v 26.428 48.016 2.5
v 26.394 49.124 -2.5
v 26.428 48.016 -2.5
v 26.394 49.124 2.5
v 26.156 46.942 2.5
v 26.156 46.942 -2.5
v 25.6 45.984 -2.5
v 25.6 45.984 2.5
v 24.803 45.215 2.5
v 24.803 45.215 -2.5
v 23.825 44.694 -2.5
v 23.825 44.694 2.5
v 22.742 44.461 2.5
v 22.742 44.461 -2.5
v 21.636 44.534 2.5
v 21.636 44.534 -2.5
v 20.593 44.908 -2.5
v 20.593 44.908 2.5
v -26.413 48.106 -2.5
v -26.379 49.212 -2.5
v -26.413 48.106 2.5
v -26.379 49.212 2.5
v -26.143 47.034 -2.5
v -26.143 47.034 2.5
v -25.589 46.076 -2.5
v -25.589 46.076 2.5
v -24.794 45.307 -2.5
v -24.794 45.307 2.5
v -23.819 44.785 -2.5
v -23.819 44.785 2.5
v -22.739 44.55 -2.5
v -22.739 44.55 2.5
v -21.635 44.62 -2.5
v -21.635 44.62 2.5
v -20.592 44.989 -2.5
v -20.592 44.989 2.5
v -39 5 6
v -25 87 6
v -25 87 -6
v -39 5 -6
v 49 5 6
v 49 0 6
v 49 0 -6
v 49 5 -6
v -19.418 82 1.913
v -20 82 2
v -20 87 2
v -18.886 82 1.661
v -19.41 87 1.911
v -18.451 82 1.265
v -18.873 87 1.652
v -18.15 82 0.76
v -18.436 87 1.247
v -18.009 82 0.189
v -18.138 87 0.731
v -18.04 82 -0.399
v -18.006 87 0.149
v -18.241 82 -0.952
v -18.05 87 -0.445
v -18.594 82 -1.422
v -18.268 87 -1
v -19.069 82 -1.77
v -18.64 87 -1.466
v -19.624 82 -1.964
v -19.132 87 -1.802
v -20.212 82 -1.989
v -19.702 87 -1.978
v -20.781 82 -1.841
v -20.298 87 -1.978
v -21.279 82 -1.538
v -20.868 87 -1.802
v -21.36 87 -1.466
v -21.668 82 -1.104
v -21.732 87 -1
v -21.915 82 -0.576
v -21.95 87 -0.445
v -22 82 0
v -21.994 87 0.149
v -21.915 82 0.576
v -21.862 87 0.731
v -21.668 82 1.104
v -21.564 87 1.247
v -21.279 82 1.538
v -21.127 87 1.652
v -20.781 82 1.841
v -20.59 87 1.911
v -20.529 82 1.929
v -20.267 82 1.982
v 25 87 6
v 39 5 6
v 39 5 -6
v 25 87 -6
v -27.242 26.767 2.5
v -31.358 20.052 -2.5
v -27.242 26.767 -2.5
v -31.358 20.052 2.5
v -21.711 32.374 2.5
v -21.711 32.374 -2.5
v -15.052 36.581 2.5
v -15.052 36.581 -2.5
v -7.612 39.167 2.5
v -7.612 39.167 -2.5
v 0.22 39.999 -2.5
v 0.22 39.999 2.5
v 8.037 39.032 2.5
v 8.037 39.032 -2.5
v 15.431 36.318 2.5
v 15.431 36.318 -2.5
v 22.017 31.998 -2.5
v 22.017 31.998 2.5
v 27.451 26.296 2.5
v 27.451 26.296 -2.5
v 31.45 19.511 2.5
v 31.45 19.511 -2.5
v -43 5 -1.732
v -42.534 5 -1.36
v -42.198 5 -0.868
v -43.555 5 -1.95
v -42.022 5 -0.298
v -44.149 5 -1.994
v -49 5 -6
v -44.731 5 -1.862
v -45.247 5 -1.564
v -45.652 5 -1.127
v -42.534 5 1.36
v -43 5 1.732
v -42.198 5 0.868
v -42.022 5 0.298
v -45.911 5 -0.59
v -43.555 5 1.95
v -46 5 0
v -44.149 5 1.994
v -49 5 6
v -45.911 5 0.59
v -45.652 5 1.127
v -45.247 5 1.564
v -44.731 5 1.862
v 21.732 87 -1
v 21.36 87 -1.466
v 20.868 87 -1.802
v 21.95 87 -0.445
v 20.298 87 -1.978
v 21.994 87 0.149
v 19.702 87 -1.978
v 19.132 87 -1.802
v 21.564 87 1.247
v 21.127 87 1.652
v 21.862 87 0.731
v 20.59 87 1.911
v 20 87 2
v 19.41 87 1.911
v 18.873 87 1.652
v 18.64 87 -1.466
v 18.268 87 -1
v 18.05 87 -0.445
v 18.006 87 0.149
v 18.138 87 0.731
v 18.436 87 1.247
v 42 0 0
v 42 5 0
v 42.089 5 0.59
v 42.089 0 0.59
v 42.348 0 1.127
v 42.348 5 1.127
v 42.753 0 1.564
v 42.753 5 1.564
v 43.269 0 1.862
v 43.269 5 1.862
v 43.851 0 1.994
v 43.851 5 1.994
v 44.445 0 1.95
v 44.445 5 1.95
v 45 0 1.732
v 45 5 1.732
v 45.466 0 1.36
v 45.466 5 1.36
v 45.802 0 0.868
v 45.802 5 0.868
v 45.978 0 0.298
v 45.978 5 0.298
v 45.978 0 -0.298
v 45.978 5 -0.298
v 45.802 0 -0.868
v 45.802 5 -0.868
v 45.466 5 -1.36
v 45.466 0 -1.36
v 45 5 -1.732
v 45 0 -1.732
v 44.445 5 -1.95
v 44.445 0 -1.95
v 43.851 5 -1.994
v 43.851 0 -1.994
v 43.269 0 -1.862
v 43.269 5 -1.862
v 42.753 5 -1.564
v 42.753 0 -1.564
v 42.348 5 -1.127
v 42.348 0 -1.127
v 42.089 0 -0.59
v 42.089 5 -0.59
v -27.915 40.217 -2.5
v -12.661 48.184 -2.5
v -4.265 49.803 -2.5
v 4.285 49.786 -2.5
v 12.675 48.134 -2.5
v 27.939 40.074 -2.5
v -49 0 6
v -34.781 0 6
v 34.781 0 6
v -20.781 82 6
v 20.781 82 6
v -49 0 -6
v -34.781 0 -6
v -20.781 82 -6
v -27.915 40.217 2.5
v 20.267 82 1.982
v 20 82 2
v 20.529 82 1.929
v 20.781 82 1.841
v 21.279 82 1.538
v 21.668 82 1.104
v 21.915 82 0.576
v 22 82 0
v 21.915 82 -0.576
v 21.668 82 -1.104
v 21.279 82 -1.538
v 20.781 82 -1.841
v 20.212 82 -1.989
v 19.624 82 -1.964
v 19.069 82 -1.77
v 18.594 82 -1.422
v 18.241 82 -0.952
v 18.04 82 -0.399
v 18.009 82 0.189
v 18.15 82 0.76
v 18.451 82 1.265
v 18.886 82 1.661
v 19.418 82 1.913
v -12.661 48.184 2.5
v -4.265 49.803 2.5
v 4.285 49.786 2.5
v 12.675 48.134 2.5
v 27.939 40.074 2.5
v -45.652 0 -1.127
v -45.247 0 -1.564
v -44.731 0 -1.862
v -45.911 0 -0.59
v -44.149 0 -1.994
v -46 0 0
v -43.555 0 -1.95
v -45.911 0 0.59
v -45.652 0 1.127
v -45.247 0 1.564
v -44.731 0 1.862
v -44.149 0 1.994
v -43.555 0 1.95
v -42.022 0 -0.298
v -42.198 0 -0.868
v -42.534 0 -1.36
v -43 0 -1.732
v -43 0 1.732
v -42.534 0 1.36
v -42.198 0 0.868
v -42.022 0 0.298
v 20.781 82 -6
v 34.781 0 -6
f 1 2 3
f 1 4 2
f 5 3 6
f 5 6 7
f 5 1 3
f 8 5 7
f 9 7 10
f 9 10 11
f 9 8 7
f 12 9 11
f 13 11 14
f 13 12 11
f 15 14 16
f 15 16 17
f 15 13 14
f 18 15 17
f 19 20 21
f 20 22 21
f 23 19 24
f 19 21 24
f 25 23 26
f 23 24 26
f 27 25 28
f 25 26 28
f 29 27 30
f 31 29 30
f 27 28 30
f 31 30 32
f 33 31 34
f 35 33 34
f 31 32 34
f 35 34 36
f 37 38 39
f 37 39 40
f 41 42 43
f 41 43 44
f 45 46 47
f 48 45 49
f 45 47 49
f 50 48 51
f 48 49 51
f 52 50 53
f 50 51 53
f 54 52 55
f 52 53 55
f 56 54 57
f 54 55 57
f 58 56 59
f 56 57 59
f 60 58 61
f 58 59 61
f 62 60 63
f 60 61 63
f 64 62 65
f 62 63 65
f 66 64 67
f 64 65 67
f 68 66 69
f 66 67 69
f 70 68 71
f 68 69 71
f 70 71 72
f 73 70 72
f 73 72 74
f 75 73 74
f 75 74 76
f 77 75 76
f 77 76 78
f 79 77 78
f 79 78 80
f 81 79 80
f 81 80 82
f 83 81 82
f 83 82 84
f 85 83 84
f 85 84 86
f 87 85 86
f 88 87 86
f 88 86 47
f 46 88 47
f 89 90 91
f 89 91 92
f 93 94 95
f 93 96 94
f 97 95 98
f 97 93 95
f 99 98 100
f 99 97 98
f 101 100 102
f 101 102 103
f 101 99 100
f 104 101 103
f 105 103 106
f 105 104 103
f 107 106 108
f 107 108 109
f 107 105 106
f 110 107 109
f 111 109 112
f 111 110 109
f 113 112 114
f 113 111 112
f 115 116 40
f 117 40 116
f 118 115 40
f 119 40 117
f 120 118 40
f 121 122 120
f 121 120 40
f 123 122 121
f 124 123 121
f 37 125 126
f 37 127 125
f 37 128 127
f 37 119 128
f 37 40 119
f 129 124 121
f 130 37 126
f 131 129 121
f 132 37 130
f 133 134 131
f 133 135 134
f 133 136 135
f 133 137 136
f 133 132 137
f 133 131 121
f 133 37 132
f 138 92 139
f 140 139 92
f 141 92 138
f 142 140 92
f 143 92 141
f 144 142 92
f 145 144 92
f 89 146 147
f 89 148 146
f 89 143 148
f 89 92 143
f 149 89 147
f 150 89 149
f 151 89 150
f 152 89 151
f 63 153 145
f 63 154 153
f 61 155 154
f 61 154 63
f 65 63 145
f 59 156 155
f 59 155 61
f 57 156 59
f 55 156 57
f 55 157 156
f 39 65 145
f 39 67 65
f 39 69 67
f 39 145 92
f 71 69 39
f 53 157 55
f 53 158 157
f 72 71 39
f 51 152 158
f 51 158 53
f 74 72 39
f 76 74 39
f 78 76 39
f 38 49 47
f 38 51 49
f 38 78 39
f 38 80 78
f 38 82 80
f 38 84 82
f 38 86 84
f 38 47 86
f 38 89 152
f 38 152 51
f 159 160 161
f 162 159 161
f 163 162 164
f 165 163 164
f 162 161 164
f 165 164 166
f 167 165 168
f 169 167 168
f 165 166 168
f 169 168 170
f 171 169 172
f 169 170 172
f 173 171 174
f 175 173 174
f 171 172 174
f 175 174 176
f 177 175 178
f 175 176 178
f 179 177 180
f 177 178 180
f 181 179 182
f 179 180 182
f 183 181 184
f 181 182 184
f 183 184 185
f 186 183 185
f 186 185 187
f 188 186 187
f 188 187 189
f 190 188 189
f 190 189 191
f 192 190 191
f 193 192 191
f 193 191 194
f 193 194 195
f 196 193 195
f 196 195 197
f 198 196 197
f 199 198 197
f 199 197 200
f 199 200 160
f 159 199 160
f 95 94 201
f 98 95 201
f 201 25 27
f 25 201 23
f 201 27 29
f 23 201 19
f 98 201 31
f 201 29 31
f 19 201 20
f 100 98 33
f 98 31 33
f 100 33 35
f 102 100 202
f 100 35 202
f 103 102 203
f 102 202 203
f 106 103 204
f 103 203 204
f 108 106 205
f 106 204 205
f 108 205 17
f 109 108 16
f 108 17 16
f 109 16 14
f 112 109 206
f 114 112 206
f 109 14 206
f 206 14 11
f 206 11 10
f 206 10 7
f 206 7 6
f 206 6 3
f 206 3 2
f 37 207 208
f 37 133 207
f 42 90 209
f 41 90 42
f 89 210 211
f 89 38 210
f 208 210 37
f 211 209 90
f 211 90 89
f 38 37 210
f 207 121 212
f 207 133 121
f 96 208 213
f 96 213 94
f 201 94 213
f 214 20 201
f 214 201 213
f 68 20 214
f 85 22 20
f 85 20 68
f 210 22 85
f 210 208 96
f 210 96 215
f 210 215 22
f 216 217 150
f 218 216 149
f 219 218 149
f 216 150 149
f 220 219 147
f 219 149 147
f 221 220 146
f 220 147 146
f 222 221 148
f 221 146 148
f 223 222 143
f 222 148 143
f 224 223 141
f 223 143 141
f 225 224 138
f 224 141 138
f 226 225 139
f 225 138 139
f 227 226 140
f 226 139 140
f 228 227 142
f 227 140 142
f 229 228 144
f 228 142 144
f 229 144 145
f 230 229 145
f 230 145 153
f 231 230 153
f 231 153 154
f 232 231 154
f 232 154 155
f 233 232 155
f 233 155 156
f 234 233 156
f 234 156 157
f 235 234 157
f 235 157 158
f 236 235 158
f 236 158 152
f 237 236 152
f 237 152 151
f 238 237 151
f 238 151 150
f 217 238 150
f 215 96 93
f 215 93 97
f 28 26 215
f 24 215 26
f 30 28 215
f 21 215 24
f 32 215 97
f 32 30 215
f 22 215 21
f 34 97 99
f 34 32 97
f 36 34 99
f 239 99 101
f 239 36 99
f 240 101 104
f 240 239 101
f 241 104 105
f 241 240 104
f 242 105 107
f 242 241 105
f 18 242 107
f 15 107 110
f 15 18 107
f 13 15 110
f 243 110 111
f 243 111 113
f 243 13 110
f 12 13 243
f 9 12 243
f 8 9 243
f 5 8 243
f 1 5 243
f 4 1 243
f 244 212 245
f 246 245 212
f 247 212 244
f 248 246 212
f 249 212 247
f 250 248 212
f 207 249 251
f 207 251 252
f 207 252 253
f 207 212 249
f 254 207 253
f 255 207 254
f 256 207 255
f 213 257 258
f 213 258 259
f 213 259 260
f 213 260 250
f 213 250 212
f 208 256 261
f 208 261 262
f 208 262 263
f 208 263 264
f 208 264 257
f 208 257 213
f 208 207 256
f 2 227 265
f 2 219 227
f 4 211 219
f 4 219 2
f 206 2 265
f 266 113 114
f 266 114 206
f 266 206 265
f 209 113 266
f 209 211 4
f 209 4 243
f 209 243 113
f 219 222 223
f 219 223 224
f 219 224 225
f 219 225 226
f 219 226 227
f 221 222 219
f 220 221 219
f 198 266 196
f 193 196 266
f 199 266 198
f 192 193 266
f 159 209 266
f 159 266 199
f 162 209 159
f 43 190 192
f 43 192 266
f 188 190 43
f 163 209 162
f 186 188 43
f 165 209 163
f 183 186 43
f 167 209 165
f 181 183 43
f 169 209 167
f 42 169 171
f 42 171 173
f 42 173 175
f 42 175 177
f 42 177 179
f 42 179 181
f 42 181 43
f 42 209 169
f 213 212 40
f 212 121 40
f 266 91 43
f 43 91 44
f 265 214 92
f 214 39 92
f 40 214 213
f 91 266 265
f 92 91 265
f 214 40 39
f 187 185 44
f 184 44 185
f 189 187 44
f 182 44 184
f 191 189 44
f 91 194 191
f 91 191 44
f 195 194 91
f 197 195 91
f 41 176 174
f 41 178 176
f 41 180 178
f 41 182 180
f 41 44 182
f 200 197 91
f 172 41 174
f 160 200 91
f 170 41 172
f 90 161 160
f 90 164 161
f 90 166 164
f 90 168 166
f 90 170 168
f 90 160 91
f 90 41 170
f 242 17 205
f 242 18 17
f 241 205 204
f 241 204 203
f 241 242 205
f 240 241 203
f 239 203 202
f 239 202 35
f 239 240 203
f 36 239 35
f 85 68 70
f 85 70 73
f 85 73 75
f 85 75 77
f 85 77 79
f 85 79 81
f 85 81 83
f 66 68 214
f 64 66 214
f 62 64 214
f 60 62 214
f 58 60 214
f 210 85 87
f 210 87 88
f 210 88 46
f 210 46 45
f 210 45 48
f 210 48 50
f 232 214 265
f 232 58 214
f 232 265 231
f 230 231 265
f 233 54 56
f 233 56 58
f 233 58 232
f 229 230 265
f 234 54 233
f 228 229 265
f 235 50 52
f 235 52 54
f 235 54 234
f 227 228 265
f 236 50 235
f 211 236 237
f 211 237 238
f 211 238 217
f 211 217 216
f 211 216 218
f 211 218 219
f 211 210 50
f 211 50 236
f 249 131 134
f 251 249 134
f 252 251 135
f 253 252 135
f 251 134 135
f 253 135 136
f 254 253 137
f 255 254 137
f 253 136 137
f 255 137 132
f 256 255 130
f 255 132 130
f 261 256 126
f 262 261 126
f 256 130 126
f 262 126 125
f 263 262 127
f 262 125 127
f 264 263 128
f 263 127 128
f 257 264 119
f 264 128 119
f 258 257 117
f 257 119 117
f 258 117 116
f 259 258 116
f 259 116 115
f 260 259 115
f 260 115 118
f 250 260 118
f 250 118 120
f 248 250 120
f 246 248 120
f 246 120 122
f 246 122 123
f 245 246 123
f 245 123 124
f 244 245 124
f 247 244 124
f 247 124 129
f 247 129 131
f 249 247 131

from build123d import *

# Parameters (mm, degrees)
BOSS_EXTRUDE1_DEPTH = 6
BOSS_EXTRUDE2_DEPTH = 2.5
FILLET1_R           = 4
SKETCH3_R           = 2
CUT_EXTRUDE1_DEPTH  = 96.713112999
SKETCH4_R           = 2
CUT_EXTRUDE2_DEPTH  = 5


with BuildPart() as part:
    # Sketch1 → Boss-Extrude1 (new, symmetric)
    with BuildSketch(Plane.XY):
        Polygon((-49, 0), (-34.781308697, 0), (-20.781308697, 82), (20.781308697, 82), (34.781308697, 0), (49, 0), (49, 5), (39, 5), (25, 87), (-25, 87), (-39, 5), (-49, 5), align=None)
    extrude(amount=BOSS_EXTRUDE1_DEPTH, both=True)

    # Sketch2 → Boss-Extrude2 (add, symmetric)
    with BuildSketch(Plane.XY):
        with BuildLine():
            Line((31.450240635, 19.510541506), (27.939451789, 40.073733316))
            ThreePointArc((27.939451789, 40.073733316), (0.037609002, 49.999938394), (-27.914924838, 40.217391174))
            Line((-27.914924838, 40.217391174), (-31.357853442, 20.051666495))
            ThreePointArc((-31.357853442, 20.051666495), (0.220379798, 39.998805231), (31.450240635, 19.510541506))
        make_face()
    extrude(amount=BOSS_EXTRUDE2_DEPTH, both=True)

    # Fillet1
    fillet1_edges = [part.edges().sort_by_distance(p)[0] for p in [
        (27.939451789, 40.073733316, 0),
        (-27.914924838, 40.217391174, 0),
    ]]
    fillet(fillet1_edges, radius=FILLET1_R)

    # Sketch3 → Cut-Extrude1 (cut, through all)
    with BuildSketch(Plane(origin=(0, 5, 0), x_dir=(1, 0, 0), z_dir=(0, 1, 0))):
        with Locations(Location((-44, 0, 0), (0, 0, 180))):
            Circle(SKETCH3_R)
        with Locations(Location((44, 0, 0), (0, 0, 180))):
            Circle(SKETCH3_R)
    extrude(amount=-CUT_EXTRUDE1_DEPTH, mode=Mode.SUBTRACT)

    # Sketch4 → Cut-Extrude2 (cut)
    with BuildSketch(Plane(origin=(0, 87, 0), x_dir=(1, 0, 0), z_dir=(0, 1, 0))):
        with Locations(Location((-20, 0, 0), (0, 0, 270))):
            Circle(SKETCH4_R)
        with Locations(Location((20, 0, 0), (0, 0, 270))):
            Circle(SKETCH4_R)
    extrude(amount=-CUT_EXTRUDE2_DEPTH, mode=Mode.SUBTRACT)


solid = part.part
